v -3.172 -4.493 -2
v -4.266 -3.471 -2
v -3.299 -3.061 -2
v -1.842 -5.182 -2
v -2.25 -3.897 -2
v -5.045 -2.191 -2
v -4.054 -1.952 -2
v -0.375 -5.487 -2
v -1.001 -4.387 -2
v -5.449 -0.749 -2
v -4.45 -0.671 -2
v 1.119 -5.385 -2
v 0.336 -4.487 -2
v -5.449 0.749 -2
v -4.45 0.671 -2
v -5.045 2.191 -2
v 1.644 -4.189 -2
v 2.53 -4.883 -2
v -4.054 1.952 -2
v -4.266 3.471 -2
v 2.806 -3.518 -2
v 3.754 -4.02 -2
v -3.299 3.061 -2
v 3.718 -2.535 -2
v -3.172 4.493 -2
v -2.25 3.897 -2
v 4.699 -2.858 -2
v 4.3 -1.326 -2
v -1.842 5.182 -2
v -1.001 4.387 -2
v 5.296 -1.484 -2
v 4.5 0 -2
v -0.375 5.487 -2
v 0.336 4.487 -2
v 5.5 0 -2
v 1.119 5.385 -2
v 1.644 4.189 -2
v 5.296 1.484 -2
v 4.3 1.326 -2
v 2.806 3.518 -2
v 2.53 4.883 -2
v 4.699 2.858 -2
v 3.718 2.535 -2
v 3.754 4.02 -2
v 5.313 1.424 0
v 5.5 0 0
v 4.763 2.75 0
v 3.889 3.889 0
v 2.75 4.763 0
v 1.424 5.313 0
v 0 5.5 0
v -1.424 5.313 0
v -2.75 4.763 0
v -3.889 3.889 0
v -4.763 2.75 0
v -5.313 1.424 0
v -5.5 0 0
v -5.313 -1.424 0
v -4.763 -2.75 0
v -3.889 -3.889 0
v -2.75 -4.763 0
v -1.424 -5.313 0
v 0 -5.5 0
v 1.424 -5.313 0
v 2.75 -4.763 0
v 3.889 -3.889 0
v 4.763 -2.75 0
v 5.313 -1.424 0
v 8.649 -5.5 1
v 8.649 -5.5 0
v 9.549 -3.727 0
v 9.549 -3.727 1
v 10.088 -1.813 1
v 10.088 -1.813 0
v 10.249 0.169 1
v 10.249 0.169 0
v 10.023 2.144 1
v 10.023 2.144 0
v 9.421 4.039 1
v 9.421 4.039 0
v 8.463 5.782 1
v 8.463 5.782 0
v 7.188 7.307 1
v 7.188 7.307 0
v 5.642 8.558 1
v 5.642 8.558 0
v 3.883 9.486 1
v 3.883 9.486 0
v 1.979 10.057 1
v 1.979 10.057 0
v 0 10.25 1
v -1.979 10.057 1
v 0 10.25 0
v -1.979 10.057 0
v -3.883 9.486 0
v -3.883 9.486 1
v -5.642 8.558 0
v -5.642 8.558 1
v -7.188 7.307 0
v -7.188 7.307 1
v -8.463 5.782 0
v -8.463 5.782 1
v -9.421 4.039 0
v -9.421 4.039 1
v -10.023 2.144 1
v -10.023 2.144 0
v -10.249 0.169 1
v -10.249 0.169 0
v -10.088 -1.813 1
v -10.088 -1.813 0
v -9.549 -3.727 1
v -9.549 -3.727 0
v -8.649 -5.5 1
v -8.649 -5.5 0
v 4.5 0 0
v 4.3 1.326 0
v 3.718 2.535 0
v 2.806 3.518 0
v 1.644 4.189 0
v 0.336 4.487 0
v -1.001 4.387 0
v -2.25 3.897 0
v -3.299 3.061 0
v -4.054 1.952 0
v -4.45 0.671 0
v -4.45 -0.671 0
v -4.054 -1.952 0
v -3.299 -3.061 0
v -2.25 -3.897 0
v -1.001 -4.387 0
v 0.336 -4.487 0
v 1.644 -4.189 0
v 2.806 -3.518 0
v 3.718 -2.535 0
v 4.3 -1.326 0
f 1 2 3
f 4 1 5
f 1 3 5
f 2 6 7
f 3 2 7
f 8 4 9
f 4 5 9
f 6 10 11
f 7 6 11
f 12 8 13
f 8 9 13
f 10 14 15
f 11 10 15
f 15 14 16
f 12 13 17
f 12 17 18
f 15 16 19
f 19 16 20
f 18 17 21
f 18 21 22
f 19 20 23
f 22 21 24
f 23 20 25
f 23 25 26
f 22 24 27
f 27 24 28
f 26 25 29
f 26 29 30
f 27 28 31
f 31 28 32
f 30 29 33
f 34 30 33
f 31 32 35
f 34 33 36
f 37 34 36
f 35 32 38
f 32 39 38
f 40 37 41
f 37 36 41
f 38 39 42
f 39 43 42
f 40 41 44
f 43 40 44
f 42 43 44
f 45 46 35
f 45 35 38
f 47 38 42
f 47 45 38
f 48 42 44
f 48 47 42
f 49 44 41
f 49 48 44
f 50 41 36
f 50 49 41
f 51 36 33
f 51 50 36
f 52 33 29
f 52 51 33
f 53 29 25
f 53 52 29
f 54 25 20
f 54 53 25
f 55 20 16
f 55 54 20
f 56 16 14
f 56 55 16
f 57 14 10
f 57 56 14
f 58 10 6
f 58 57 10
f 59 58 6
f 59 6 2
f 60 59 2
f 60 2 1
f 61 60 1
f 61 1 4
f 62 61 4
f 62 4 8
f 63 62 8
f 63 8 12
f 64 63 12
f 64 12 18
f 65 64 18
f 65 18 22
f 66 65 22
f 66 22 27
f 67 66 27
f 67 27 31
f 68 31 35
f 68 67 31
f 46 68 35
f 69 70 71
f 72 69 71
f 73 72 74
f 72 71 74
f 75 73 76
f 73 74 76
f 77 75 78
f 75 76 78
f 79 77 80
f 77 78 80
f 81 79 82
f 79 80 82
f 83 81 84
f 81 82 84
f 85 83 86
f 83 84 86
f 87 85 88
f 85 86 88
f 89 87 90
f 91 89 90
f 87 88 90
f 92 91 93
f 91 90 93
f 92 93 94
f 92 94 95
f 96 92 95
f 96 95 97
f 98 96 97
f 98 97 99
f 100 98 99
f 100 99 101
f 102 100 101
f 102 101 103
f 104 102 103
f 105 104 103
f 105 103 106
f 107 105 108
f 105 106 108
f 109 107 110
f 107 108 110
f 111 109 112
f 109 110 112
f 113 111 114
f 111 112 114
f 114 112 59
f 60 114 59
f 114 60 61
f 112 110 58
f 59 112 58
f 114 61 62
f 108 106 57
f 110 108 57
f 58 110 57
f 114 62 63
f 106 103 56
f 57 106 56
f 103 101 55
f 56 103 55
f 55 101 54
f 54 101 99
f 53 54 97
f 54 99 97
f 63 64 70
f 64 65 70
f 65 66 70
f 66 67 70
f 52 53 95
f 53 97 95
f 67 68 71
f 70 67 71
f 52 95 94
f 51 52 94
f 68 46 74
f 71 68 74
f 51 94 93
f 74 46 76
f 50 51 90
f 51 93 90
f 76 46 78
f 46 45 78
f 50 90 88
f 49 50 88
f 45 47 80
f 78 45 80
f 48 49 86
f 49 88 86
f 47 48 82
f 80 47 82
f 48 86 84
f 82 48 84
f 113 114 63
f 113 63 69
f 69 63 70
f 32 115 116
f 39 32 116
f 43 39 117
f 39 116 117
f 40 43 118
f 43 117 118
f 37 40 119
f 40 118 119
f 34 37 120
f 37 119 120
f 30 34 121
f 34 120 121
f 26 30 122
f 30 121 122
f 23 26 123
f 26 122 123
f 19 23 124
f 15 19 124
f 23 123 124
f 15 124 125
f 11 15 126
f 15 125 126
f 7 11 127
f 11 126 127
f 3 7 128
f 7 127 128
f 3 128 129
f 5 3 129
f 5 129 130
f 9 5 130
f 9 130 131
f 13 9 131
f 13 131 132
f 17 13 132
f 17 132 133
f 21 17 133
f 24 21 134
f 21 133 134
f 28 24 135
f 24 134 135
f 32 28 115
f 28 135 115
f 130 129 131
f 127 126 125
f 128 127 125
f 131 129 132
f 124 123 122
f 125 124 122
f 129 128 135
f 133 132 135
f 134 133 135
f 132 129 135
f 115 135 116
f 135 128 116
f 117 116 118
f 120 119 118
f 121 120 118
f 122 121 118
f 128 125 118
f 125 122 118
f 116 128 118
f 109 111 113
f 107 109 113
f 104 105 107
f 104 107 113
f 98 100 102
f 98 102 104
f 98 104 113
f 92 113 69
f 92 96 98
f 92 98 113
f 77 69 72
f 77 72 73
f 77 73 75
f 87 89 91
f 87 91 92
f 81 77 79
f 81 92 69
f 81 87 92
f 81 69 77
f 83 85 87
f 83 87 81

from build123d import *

# Parameters (mm, degrees)
BOSS_EXTRUDE1_DEPTH = 1
SKETCH1_4_R         = 5.5
SKETCH1_4_R_2       = 4.5
BOSS_EXTRUDE2_DEPTH = 2


with BuildPart() as part:
    # Sketch1 → Boss-Extrude1 (new body)
    with BuildSketch(Plane.XY):
        with BuildLine():
            Line((-8.649421946, -5.5), (8.649421946, -5.5))
            ThreePointArc((8.649421946, -5.5), (0, 10.25), (-8.649421946, -5.5))
        make_face()
    extrude(amount=BOSS_EXTRUDE1_DEPTH)

    # Sketch1<4> → Boss-Extrude2 (add)
    with BuildSketch(Plane.XY):
        Circle(SKETCH1_4_R)
        Circle(SKETCH1_4_R_2, mode=Mode.SUBTRACT)
    extrude(amount=-BOSS_EXTRUDE2_DEPTH)


solid = part.part
